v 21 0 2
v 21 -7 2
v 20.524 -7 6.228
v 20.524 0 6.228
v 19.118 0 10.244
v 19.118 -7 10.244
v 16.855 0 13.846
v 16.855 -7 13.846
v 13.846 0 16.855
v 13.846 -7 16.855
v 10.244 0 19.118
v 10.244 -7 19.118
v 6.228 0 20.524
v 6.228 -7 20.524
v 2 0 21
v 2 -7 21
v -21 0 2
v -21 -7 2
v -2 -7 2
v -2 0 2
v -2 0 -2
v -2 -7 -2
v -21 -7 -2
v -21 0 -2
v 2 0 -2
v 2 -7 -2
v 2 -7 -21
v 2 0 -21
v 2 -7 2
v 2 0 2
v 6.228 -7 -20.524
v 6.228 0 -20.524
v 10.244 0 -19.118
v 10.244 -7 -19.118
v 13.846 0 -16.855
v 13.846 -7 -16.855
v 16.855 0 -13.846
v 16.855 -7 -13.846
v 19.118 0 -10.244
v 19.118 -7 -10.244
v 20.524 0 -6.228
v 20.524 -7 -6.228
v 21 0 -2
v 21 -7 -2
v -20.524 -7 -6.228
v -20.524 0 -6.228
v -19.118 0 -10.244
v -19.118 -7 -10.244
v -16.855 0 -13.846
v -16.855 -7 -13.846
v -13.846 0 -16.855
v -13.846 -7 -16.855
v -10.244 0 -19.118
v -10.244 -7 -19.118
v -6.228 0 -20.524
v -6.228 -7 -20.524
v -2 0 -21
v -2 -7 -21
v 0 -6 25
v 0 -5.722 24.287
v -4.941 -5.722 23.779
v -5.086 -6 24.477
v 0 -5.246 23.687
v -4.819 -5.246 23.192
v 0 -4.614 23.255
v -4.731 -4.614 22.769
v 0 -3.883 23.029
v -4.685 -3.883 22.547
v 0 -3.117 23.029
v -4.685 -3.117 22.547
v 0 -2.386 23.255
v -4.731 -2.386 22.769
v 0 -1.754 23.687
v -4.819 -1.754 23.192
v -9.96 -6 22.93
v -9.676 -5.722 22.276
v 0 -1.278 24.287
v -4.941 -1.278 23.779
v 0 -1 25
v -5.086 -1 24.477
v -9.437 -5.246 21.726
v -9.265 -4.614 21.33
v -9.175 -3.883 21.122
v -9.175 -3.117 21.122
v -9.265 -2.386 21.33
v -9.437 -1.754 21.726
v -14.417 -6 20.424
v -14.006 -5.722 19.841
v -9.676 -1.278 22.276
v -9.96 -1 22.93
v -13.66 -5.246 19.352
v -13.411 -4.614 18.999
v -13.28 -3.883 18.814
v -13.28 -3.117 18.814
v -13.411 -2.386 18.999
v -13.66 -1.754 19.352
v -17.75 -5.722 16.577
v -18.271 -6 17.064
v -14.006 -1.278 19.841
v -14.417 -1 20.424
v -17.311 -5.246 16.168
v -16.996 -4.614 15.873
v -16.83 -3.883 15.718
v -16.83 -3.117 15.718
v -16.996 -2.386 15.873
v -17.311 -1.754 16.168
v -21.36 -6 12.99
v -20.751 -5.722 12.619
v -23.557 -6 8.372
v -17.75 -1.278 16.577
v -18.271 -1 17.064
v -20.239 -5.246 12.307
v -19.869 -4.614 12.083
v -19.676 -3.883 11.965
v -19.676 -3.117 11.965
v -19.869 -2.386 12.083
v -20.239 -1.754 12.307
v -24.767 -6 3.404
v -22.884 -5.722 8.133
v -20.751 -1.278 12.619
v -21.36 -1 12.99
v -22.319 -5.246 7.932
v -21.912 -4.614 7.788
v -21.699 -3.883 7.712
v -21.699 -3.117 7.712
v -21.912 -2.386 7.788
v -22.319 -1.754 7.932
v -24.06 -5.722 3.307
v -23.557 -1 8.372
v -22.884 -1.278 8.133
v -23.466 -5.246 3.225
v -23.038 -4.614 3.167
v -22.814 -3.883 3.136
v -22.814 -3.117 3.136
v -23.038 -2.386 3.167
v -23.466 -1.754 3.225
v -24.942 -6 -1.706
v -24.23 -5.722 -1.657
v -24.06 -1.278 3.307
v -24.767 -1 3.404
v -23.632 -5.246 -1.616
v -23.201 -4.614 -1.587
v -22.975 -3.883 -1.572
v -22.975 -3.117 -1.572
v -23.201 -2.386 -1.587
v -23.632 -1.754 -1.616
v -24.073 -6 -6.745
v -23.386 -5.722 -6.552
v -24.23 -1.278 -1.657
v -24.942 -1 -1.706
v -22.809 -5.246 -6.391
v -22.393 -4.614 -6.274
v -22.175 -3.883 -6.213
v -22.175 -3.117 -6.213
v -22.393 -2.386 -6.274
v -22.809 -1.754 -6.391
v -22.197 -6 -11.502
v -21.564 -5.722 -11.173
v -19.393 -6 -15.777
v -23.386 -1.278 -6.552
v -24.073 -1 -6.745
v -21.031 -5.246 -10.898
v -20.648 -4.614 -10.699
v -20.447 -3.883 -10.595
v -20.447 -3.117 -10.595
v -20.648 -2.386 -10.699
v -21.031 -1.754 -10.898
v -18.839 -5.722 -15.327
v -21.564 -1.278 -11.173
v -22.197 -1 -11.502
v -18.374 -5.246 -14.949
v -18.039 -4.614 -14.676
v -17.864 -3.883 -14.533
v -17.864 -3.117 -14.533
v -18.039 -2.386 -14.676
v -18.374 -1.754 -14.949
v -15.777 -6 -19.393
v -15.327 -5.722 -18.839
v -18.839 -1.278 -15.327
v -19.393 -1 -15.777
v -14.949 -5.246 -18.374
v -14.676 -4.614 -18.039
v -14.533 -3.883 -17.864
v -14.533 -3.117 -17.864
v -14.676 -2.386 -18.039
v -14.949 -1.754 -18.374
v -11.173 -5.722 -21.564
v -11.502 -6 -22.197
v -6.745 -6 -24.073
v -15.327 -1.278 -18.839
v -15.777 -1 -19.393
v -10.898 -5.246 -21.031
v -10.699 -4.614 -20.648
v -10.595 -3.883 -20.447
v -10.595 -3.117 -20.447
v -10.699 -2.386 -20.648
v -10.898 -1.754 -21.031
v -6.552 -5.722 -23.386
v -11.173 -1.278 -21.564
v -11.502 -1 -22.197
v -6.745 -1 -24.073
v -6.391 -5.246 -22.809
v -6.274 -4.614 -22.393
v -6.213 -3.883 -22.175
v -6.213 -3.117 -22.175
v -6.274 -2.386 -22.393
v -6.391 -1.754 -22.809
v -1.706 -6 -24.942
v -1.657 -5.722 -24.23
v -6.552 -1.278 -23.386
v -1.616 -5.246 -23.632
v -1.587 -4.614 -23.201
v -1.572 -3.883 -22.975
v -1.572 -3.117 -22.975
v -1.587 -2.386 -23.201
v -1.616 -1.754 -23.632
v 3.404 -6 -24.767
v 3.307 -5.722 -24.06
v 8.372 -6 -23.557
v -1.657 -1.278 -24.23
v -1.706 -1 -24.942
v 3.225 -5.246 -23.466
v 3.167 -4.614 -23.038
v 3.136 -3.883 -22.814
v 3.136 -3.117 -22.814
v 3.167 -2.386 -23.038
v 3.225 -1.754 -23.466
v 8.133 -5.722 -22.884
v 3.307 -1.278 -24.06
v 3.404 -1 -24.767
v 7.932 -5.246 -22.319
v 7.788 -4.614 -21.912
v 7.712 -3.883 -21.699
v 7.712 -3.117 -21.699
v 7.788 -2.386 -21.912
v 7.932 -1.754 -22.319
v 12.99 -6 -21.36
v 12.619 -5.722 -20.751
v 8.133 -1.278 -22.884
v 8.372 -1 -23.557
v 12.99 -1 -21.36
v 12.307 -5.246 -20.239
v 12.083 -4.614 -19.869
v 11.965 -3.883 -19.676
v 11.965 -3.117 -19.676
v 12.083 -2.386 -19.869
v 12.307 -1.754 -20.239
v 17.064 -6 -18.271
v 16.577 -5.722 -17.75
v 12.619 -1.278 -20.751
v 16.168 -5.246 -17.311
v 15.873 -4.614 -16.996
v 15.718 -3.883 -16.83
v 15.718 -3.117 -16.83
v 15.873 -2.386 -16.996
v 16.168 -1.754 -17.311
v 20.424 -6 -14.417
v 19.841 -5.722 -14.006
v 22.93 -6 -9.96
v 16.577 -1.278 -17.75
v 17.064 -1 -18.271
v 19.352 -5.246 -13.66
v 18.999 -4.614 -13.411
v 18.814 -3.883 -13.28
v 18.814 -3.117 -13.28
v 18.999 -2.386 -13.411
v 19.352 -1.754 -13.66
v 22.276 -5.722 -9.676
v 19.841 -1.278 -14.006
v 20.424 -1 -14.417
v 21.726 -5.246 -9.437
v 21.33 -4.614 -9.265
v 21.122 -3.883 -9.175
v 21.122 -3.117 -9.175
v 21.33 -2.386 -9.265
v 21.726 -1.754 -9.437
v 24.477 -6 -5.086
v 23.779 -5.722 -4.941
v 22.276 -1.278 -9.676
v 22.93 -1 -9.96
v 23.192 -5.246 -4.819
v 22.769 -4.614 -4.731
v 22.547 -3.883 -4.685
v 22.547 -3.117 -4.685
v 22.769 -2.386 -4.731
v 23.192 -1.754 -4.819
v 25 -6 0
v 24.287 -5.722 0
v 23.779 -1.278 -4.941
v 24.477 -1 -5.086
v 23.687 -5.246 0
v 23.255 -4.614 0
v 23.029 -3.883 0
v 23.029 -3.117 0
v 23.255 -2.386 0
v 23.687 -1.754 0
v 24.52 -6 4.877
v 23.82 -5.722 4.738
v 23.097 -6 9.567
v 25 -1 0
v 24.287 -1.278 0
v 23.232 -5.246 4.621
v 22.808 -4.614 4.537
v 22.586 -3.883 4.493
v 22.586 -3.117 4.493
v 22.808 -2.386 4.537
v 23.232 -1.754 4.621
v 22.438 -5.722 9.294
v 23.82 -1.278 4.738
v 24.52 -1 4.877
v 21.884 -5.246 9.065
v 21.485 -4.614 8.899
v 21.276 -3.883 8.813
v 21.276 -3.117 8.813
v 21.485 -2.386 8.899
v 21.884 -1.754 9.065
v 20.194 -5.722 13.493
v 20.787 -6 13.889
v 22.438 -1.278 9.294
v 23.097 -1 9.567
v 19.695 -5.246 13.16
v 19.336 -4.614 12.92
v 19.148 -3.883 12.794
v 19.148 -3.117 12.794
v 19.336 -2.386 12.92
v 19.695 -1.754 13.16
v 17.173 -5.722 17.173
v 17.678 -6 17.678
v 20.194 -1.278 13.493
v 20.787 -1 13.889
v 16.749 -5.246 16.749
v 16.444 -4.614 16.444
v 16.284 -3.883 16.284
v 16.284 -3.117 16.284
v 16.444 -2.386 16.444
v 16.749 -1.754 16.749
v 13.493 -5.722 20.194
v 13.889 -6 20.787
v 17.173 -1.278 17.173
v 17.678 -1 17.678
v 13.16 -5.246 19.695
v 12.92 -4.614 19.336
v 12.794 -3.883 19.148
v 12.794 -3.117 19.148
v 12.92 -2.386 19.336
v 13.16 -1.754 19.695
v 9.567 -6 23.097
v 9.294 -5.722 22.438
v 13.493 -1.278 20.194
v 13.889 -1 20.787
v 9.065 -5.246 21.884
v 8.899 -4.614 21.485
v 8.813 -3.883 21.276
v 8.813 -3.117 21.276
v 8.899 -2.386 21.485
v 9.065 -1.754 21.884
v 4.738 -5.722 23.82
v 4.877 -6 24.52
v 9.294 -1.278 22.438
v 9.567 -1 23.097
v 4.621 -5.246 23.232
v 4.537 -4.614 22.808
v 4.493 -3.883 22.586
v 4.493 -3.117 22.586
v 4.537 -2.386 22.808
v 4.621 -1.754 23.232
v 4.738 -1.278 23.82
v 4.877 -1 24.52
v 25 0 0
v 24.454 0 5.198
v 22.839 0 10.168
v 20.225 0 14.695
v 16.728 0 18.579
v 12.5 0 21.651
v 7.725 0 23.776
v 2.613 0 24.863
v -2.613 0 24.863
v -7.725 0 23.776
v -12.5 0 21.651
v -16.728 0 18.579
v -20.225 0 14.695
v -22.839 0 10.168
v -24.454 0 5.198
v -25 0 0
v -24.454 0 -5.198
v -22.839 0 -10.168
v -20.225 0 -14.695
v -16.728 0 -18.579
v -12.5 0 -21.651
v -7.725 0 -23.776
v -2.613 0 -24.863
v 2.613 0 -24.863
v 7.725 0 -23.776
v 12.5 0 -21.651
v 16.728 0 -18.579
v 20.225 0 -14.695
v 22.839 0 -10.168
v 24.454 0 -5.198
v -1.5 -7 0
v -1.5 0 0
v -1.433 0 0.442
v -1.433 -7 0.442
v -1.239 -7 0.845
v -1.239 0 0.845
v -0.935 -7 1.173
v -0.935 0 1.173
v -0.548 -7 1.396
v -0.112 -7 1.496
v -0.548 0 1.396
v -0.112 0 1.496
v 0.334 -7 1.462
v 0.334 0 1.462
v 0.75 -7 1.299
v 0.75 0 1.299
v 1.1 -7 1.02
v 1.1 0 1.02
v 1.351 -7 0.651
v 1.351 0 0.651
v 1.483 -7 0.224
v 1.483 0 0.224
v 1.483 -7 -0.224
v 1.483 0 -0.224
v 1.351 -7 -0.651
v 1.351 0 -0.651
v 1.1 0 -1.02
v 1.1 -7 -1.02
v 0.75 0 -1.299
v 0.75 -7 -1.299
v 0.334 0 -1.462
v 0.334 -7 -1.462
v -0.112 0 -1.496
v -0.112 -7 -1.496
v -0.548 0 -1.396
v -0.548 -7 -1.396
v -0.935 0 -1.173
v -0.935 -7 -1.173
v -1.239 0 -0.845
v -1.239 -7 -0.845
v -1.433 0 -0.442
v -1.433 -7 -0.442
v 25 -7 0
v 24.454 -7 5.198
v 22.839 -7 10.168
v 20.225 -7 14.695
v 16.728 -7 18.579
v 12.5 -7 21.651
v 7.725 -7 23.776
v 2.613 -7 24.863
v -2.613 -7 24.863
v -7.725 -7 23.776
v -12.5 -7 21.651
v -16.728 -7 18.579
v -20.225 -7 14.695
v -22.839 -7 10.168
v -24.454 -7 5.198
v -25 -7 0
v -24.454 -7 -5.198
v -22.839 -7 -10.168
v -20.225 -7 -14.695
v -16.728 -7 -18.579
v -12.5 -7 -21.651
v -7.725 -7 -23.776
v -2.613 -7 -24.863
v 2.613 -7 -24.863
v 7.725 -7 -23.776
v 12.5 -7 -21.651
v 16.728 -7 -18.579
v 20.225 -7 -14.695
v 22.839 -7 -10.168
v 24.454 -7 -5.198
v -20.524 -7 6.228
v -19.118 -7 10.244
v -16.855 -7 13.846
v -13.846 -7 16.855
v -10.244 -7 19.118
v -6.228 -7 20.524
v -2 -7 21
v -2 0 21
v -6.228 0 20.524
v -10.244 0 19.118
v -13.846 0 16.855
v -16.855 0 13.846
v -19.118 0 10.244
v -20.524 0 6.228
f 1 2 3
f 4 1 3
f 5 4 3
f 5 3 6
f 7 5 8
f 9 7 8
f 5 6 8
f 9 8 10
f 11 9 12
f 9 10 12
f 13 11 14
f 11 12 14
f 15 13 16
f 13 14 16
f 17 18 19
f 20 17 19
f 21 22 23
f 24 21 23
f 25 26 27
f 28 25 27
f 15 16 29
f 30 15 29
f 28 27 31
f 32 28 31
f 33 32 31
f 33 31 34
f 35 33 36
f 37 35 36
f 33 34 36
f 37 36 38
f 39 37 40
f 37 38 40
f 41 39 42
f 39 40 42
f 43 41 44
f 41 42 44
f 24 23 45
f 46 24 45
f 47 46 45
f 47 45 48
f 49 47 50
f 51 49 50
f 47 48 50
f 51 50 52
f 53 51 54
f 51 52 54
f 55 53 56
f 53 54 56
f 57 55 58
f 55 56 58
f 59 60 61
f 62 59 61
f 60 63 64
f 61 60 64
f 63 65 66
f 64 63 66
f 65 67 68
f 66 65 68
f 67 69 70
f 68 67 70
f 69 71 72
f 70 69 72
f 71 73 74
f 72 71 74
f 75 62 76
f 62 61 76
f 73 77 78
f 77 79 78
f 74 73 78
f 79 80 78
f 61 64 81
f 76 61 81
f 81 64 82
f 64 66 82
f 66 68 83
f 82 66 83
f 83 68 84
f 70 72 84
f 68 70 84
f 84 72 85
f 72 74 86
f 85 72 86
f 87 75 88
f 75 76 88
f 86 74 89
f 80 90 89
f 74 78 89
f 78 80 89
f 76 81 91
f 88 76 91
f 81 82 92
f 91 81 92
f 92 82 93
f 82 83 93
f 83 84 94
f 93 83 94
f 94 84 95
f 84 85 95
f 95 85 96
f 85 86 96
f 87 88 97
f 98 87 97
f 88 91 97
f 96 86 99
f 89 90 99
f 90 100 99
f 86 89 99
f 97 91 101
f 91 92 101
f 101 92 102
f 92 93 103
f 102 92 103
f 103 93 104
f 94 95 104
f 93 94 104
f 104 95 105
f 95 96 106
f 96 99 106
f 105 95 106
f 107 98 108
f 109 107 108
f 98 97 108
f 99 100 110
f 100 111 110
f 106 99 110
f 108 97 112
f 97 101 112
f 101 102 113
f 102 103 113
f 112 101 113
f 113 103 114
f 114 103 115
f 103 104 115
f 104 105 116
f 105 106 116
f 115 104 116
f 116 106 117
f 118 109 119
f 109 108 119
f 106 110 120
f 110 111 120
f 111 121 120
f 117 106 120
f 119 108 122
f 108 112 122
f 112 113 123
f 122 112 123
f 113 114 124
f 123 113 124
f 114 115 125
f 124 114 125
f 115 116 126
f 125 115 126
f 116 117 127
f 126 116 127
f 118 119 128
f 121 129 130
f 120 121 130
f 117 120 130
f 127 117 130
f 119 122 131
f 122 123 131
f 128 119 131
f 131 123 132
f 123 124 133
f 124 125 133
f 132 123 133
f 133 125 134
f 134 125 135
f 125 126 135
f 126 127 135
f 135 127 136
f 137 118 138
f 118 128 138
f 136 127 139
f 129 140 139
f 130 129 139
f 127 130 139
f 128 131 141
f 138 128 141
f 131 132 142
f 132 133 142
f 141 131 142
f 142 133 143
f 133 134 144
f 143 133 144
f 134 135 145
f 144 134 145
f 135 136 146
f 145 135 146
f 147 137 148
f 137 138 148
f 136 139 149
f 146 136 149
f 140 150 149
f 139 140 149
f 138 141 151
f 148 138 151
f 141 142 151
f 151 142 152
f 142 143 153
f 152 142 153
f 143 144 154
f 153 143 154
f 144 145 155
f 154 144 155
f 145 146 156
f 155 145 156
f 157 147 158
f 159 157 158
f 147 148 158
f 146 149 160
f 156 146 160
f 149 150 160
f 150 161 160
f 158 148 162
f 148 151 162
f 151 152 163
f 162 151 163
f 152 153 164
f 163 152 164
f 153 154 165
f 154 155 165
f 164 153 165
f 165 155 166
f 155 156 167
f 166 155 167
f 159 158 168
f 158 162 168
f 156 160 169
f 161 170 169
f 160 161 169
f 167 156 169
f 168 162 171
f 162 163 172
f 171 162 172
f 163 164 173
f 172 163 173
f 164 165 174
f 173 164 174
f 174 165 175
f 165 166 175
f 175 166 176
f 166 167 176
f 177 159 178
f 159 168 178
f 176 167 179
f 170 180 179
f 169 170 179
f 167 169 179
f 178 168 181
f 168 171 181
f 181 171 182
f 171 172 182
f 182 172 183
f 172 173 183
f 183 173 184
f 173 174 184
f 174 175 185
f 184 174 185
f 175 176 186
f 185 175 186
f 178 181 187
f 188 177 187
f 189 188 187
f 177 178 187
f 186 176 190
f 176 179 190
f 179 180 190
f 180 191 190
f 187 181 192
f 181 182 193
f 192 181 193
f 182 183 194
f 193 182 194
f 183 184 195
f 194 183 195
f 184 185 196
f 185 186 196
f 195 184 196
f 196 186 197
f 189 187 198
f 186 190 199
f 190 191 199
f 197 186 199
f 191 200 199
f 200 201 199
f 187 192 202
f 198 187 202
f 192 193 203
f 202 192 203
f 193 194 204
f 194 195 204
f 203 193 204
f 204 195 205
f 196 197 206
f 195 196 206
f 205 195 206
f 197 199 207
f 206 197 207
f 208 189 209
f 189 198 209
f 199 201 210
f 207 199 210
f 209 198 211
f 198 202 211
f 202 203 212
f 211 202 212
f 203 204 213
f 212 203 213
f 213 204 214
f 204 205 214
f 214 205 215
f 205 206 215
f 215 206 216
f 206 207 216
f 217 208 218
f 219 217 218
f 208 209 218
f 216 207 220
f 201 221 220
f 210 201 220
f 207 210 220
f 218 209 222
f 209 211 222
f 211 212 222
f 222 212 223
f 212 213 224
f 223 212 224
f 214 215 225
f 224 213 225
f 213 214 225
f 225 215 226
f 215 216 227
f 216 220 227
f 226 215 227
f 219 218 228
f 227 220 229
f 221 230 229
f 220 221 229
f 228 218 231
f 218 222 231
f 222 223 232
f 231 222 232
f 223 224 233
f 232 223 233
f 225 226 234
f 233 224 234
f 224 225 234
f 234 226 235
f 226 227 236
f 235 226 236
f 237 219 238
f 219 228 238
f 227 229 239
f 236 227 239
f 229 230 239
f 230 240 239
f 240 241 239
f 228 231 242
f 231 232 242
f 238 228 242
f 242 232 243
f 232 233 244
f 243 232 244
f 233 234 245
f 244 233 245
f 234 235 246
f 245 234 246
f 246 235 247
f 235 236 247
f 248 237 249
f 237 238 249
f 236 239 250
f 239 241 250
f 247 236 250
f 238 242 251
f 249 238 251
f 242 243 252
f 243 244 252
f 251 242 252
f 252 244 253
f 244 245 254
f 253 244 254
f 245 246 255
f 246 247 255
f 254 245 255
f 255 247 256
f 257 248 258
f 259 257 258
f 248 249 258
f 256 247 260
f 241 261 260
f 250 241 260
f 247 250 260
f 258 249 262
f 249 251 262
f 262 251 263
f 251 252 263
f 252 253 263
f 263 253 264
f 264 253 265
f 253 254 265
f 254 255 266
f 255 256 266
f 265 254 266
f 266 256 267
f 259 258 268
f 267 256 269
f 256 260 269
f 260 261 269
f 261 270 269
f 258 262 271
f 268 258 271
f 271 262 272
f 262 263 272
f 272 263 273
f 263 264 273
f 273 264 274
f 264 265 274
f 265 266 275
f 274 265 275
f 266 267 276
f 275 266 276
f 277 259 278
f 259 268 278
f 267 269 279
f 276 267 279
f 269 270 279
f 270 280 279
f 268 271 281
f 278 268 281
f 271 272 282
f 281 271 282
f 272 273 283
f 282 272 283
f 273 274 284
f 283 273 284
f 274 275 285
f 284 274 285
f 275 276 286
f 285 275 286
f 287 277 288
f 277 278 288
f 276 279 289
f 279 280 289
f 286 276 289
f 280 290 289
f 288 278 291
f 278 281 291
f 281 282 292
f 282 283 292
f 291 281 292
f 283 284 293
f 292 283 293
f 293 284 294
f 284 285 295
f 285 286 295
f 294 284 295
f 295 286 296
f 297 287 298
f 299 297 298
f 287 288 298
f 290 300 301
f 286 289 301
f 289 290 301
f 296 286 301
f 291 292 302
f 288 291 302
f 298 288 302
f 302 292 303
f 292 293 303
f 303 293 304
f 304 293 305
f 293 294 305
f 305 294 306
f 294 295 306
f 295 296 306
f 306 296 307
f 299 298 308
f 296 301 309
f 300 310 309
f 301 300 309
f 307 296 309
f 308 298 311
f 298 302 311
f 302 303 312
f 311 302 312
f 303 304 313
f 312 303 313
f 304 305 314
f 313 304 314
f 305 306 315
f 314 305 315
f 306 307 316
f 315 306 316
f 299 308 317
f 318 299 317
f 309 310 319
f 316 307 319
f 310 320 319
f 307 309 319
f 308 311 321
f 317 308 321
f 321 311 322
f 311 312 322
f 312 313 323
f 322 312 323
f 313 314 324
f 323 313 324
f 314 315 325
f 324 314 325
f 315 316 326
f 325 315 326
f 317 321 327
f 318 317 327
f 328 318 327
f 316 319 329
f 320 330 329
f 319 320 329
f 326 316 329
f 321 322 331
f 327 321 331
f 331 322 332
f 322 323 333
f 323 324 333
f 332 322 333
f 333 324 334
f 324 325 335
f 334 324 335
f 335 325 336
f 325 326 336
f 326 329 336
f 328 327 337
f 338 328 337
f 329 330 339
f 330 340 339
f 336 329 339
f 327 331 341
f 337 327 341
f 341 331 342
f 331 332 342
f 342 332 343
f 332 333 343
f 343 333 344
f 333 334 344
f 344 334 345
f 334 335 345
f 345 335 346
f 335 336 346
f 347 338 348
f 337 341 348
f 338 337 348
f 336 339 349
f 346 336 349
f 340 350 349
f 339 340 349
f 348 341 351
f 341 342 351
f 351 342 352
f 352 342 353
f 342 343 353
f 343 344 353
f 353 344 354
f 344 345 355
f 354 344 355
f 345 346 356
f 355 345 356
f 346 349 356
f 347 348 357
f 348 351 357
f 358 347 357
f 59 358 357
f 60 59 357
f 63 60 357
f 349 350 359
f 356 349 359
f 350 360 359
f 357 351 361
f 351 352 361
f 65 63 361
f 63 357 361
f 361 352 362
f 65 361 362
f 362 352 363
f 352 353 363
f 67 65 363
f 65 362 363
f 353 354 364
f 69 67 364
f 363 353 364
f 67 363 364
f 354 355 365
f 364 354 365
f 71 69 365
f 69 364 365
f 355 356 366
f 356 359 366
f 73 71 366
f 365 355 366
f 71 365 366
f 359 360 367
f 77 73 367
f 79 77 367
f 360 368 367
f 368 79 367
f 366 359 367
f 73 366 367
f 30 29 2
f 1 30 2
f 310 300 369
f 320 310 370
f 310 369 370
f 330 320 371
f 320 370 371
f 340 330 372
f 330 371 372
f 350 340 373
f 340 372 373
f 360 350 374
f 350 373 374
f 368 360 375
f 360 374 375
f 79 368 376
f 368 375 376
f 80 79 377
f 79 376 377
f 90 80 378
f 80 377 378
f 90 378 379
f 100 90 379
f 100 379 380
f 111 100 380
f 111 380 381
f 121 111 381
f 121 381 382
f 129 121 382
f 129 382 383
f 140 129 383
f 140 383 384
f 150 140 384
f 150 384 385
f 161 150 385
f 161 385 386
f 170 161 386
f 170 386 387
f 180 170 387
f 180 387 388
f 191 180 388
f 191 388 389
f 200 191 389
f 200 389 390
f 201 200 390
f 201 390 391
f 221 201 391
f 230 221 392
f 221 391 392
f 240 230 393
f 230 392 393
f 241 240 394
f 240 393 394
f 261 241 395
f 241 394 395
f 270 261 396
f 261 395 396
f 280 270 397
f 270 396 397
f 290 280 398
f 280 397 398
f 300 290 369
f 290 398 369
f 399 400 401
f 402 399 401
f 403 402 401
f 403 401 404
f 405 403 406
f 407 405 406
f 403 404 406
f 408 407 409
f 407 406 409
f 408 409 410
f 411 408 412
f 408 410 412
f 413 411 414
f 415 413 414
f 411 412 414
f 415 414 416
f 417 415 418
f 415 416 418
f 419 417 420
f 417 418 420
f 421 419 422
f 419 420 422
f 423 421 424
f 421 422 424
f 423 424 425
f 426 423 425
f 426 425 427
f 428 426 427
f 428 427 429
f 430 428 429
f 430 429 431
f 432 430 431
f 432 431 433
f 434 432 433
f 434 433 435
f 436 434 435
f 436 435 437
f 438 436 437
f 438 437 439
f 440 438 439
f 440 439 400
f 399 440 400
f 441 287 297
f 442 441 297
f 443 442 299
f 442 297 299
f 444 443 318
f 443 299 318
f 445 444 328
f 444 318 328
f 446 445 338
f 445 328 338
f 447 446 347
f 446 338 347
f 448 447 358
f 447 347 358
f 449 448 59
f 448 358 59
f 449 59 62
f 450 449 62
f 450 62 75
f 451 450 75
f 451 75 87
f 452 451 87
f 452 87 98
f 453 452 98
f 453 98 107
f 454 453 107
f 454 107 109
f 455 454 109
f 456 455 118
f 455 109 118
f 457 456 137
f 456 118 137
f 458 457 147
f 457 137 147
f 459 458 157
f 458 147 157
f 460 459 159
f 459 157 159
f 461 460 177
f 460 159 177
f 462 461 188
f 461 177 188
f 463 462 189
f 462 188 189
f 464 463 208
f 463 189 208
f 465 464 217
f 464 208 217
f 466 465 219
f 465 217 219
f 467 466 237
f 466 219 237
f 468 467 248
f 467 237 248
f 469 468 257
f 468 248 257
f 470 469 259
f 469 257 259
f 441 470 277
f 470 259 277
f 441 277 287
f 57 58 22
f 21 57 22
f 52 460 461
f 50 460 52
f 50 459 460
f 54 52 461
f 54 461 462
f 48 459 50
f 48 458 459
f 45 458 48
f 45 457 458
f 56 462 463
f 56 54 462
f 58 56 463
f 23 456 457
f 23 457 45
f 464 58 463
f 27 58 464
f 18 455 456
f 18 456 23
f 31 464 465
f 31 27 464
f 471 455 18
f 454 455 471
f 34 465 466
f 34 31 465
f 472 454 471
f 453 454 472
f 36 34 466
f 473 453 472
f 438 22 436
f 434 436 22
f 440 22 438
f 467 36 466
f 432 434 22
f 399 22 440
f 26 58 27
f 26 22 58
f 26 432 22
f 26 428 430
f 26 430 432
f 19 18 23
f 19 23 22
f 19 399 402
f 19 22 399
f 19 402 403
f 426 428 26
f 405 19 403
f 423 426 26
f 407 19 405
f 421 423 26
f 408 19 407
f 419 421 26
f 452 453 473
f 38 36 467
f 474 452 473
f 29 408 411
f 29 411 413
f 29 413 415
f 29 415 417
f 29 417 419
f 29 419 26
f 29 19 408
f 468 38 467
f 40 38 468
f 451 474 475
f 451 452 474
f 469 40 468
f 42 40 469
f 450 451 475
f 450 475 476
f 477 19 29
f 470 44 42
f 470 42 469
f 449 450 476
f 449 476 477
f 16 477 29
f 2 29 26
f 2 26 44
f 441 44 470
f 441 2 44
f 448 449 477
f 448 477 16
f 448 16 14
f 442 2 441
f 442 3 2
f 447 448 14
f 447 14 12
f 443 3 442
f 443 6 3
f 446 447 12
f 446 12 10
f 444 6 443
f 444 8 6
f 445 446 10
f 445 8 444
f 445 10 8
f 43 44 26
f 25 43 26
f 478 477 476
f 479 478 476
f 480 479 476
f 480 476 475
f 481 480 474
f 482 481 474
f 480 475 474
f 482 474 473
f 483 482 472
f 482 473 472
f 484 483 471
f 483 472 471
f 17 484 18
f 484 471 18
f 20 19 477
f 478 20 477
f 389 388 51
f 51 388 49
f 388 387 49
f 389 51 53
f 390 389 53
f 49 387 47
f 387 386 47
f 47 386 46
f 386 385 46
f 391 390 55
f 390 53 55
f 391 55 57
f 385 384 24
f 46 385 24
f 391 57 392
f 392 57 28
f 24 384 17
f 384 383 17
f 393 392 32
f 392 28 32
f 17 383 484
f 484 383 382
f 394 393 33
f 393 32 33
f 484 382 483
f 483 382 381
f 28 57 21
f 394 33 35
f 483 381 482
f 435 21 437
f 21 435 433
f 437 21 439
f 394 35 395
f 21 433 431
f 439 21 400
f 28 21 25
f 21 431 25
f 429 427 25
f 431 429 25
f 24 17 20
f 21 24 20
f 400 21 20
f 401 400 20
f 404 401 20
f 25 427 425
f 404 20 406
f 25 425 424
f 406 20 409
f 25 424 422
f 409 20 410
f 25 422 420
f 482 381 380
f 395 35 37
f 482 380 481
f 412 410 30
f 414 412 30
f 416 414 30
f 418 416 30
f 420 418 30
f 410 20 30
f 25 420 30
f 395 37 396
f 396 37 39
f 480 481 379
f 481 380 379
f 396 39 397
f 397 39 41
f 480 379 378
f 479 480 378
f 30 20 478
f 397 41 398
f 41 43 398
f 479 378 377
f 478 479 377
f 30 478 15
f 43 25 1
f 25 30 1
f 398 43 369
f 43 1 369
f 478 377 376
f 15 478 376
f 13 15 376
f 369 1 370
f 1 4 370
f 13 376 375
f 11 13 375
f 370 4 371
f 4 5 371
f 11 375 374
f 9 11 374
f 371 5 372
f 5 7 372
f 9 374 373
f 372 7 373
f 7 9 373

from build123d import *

# Parameters (mm, degrees)
F0_R     = 25
F1_DEPTH = 7
F5_R     = 1.5
F6_DEPTH = 7.001
F8_DEPTH = 7.001


with BuildPart() as f1:
    # F0 (on Front) → F1 (new body)
    with BuildSketch(Plane.XZ):
        Circle(F0_R)
    extrude(amount=F1_DEPTH)

    # F2 (on Right) → F4 (revolve, cut)
    with BuildSketch(Plane.YZ):
        with BuildLine():
            Line((-1, 25), (-6, 25))
            ThreePointArc((-6, 25), (-3.5, 23), (-1, 25))
        make_face()
    revolve(axis=Axis((0, -8.172696, 0), (0, -1, 0)), mode=Mode.SUBTRACT)

    # F5 (on face) → F6 (cut, through all)
    with BuildSketch(Plane(origin=(0, 0, 0), x_dir=(-1, 0, 0), z_dir=(0, 1, 0))):
        Circle(F5_R)
    extrude(amount=-F6_DEPTH, mode=Mode.SUBTRACT)

    # F7 (on face) → F8 (cut, through all)
    with BuildSketch(Plane.XZ.offset(7)):
        with BuildLine():
            Line((-21, 2), (-2, 2))
            Line((-2, 2), (-2, 21))
            ThreePointArc((-2, 21), (-15.435029, 15.435029), (-21, 2))
        make_face()
        with BuildLine():
            Line((2, 21), (2, 2))
            Line((2, 2), (21, 2))
            ThreePointArc((21, 2), (15.435029, 15.435029), (2, 21))
        make_face()
        with BuildLine():
            Line((2, -2), (2, -21))
            ThreePointArc((2, -21), (15.435029, -15.435029), (21, -2))
            Line((21, -2), (2, -2))
        make_face()
        with BuildLine():
            ThreePointArc((-21, -2), (-15.435029, -15.435029), (-2, -21))
            Line((-2, -21), (-2, -2))
            Line((-2, -2), (-21, -2))
        make_face()
    extrude(amount=-F8_DEPTH, mode=Mode.SUBTRACT)


solid = f1.part
